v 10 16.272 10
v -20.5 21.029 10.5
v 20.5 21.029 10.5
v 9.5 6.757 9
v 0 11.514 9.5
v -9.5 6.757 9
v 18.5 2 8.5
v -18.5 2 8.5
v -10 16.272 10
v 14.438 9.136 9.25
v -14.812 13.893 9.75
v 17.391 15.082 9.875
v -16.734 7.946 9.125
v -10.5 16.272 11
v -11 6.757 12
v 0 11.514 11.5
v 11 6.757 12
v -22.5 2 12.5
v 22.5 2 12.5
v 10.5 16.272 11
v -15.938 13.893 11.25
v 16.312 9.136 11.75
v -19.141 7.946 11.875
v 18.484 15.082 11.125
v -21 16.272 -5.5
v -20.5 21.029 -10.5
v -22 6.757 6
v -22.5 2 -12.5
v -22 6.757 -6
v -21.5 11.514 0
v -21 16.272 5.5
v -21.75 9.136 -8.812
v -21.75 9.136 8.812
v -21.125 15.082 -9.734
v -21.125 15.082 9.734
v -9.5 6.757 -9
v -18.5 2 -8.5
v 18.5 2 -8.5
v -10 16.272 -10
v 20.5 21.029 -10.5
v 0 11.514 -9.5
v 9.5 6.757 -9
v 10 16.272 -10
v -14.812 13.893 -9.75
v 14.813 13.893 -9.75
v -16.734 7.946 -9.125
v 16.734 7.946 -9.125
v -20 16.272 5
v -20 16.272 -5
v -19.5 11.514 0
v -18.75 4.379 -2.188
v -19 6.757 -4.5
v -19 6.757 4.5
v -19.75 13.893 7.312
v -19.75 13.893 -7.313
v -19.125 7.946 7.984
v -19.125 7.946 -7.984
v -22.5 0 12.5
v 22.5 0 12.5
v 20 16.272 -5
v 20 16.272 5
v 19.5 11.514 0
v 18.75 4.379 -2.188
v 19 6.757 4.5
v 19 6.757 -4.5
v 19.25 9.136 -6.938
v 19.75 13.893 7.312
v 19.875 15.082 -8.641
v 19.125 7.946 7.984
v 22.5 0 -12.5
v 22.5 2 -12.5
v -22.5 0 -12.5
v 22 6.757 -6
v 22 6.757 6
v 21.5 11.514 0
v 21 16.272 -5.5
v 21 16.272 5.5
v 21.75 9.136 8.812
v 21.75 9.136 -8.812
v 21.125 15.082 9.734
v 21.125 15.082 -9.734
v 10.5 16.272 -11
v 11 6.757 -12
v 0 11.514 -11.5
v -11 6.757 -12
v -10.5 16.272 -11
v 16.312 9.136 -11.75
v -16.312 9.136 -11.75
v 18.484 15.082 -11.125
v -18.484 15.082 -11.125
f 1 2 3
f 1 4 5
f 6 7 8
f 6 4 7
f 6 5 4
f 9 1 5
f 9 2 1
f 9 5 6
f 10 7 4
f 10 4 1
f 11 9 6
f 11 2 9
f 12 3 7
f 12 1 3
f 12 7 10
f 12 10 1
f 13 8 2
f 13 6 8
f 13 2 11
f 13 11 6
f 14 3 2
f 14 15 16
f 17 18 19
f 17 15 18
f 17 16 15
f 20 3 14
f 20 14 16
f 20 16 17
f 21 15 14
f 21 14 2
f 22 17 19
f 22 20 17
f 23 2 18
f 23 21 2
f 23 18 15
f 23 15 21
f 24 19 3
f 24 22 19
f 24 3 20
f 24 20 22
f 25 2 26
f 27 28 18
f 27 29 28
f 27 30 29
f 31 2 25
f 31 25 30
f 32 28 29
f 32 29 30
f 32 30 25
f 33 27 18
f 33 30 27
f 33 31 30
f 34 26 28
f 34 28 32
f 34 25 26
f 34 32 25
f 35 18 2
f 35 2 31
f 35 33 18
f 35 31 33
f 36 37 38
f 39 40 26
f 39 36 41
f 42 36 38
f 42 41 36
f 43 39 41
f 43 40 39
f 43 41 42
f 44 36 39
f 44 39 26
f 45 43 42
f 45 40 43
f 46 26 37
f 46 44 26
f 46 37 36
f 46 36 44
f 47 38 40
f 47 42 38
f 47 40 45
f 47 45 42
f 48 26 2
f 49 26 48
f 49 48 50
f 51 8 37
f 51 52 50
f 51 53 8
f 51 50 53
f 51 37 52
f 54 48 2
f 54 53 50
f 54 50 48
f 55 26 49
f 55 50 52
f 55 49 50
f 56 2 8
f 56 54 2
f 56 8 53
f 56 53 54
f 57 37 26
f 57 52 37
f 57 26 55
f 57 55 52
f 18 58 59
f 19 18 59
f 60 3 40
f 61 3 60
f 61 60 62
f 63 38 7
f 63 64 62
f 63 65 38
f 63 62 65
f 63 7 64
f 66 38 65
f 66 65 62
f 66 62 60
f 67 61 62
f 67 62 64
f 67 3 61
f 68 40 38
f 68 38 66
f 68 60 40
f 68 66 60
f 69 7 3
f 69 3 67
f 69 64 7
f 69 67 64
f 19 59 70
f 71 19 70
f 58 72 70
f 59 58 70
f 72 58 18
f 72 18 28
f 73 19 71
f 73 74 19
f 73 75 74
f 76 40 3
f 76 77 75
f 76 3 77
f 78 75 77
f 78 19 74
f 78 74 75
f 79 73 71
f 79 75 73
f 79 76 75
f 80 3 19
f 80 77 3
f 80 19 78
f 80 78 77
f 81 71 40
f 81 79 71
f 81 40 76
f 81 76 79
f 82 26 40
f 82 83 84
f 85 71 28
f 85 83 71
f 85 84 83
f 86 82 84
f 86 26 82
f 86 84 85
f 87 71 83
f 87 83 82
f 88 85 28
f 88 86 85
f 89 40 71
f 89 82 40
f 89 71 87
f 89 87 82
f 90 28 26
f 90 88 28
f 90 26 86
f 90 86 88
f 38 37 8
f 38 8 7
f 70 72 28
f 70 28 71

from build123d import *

# Parameters (mm, degrees)
SKETCH2_W           = 45
SKETCH2_H           = 25
BOSS_EXTRUDE1_DEPTH = 2
SKETCH3_W           = 45
SKETCH3_H           = 25
SKETCH3_W_2         = 37
SKETCH3_H_2         = 17
BOSS_EXTRUDE2_DEPTH = 35
BOSS_EXTRUDE2_TAPER = 6


with BuildPart() as part:
    # Sketch2 → Boss-Extrude1 (new body)
    with BuildSketch(Plane(origin=(0, 0, 0), x_dir=(1, 0, 0), z_dir=(0, 1, 0))):
        Rectangle(SKETCH2_W, SKETCH2_H)
    extrude(amount=BOSS_EXTRUDE1_DEPTH)

    # Sketch3 → Boss-Extrude2 (add)
    with BuildSketch(Plane(origin=(0, 2, 0), x_dir=(1, 0, 0), z_dir=(0, 1, 0))):
        Rectangle(SKETCH3_W, SKETCH3_H)
        Rectangle(SKETCH3_W_2, SKETCH3_H_2, mode=Mode.SUBTRACT)
    extrude(amount=BOSS_EXTRUDE2_DEPTH, taper=BOSS_EXTRUDE2_TAPER)


solid = part.part
